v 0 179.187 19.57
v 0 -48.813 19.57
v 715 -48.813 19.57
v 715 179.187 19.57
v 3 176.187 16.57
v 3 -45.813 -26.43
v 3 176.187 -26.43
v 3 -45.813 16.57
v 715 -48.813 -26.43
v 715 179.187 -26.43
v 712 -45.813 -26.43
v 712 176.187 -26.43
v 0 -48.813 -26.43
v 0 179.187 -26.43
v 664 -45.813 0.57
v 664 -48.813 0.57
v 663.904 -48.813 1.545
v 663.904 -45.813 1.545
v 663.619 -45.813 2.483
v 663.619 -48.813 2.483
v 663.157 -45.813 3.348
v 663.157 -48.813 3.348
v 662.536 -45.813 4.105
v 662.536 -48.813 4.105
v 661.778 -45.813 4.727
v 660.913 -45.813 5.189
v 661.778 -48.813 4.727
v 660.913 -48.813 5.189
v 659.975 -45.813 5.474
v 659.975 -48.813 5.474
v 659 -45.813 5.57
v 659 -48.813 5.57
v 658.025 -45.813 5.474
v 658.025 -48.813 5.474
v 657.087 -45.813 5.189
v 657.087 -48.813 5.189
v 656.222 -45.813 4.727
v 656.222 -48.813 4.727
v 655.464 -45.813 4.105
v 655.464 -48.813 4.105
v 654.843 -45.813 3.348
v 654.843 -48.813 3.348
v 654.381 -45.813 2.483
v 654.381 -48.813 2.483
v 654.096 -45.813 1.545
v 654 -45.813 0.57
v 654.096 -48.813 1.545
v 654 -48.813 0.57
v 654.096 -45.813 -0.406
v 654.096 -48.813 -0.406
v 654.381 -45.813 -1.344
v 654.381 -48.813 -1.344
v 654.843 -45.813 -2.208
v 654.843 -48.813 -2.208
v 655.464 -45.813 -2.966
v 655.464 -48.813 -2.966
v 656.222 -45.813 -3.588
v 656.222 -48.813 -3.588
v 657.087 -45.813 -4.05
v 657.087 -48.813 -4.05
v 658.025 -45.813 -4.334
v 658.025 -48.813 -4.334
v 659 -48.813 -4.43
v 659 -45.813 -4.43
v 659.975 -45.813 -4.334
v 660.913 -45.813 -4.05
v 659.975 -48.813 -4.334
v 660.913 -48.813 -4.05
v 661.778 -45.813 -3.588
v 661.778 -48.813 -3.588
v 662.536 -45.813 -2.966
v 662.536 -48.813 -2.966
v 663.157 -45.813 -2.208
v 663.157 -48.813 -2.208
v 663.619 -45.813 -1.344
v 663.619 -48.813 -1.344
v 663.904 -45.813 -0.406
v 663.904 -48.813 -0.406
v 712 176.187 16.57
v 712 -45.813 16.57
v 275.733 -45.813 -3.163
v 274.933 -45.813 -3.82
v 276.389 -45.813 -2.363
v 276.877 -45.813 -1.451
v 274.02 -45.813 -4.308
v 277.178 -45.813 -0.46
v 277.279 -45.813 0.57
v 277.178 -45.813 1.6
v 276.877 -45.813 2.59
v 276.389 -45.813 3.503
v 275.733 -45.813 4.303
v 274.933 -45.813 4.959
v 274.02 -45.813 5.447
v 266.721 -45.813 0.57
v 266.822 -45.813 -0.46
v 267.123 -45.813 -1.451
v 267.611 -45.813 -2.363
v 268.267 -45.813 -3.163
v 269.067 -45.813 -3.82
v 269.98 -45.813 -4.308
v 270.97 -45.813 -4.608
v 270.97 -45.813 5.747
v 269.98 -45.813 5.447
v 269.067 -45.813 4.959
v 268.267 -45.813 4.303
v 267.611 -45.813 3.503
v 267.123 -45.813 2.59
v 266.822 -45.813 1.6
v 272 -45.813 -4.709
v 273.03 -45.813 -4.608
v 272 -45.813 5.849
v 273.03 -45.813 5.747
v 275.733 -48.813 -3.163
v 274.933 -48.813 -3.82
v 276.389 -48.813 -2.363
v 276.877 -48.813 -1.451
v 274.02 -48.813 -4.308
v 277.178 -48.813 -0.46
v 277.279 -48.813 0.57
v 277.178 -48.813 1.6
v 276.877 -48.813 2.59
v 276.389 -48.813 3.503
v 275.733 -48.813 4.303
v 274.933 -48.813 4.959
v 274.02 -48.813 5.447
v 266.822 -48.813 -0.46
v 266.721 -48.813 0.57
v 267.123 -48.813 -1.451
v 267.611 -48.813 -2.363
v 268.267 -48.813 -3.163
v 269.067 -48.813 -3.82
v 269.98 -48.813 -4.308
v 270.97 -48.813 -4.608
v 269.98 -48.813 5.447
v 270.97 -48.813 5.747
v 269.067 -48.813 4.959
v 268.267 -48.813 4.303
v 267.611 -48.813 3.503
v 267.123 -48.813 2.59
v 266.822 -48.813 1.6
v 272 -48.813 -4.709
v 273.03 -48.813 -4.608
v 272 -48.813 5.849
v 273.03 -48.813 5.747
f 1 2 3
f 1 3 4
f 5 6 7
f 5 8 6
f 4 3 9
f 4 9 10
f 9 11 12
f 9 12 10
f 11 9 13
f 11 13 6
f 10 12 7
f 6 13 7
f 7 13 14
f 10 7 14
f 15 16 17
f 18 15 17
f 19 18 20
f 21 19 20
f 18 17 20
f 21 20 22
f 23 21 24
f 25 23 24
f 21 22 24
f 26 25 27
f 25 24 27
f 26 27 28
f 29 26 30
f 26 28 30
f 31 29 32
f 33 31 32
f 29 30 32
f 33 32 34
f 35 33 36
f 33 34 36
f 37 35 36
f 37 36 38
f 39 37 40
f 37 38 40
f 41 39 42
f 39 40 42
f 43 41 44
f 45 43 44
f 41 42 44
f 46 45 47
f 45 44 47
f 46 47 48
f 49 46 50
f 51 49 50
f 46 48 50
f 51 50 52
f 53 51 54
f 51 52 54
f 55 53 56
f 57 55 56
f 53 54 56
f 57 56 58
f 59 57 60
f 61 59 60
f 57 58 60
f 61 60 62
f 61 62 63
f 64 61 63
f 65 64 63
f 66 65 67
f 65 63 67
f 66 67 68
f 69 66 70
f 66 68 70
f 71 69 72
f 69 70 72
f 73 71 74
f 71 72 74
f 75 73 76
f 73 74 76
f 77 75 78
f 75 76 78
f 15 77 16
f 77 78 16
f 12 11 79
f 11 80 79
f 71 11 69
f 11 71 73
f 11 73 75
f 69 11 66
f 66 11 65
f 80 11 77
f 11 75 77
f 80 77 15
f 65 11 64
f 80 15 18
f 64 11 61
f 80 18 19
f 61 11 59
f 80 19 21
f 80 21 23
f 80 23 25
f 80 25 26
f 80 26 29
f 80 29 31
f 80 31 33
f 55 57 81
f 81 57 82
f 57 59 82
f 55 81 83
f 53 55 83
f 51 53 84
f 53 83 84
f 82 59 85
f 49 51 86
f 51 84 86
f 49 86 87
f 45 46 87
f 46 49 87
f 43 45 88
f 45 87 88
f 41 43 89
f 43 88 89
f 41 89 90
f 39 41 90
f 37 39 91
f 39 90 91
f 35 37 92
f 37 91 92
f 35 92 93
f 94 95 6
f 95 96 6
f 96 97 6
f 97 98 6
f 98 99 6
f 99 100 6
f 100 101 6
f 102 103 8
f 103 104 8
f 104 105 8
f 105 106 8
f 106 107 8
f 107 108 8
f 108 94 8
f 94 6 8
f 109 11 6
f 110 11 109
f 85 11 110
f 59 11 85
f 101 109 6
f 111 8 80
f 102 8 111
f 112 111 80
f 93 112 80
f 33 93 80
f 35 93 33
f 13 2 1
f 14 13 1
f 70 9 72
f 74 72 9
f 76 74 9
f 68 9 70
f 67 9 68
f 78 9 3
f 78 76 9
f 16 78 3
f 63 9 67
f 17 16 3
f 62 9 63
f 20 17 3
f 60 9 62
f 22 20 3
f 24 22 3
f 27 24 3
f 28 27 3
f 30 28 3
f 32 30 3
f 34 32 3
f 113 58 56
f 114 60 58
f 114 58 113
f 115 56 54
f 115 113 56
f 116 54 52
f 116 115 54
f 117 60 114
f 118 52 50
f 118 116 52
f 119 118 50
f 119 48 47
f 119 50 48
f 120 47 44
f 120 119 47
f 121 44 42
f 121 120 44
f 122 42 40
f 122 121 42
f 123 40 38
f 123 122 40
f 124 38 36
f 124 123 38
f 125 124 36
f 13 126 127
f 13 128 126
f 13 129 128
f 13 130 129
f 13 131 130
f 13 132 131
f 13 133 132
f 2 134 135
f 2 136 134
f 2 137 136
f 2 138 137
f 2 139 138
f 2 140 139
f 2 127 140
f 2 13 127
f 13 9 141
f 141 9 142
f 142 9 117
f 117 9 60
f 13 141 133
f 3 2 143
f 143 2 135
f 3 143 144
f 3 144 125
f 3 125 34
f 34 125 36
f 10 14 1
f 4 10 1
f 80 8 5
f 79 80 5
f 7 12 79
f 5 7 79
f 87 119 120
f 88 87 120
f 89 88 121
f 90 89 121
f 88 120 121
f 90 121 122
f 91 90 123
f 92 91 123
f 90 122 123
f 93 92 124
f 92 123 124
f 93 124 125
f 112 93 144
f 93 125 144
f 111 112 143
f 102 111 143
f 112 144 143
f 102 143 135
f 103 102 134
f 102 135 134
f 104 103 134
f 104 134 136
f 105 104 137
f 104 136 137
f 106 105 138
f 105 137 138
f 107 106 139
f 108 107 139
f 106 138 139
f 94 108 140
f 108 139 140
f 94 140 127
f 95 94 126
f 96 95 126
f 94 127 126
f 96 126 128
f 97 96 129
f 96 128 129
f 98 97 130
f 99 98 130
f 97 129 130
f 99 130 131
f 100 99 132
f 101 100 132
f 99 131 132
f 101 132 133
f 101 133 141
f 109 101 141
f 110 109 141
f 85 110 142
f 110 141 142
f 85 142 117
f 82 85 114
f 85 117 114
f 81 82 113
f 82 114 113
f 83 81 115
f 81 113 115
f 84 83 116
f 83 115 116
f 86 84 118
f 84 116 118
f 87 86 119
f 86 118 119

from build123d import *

# Parameters (mm, degrees)
F0_W     = 228
F0_H     = 46
F1_DEPTH = 715
F2_T     = -3
F3_R     = 5
F3_R_2   = 5.279175
F4_DEPTH = 3


with BuildPart() as f1:
    # F0 (on Right) → F1 (new body)
    with BuildSketch(Plane.YZ):
        with Locations((65.187312, -3.430253)):
            Rectangle(F0_W, F0_H)
    extrude(amount=F1_DEPTH)

    # F2
    f2_openings = [f1.faces().sort_by_distance(p)[0] for p in [
        (357.5, 65.187312, -26.430253),
    ]]
    offset(amount=F2_T, openings=f2_openings)

    # F3 (on face) → F4 (cut)
    with BuildSketch(Plane.XZ.offset(48.812688)):
        with Locations((659, 0.569747)):
            Circle(F3_R)
        with Locations((272, 0.569747)):
            Circle(F3_R_2)
    extrude(amount=-F4_DEPTH, mode=Mode.SUBTRACT)


solid = f1.part
